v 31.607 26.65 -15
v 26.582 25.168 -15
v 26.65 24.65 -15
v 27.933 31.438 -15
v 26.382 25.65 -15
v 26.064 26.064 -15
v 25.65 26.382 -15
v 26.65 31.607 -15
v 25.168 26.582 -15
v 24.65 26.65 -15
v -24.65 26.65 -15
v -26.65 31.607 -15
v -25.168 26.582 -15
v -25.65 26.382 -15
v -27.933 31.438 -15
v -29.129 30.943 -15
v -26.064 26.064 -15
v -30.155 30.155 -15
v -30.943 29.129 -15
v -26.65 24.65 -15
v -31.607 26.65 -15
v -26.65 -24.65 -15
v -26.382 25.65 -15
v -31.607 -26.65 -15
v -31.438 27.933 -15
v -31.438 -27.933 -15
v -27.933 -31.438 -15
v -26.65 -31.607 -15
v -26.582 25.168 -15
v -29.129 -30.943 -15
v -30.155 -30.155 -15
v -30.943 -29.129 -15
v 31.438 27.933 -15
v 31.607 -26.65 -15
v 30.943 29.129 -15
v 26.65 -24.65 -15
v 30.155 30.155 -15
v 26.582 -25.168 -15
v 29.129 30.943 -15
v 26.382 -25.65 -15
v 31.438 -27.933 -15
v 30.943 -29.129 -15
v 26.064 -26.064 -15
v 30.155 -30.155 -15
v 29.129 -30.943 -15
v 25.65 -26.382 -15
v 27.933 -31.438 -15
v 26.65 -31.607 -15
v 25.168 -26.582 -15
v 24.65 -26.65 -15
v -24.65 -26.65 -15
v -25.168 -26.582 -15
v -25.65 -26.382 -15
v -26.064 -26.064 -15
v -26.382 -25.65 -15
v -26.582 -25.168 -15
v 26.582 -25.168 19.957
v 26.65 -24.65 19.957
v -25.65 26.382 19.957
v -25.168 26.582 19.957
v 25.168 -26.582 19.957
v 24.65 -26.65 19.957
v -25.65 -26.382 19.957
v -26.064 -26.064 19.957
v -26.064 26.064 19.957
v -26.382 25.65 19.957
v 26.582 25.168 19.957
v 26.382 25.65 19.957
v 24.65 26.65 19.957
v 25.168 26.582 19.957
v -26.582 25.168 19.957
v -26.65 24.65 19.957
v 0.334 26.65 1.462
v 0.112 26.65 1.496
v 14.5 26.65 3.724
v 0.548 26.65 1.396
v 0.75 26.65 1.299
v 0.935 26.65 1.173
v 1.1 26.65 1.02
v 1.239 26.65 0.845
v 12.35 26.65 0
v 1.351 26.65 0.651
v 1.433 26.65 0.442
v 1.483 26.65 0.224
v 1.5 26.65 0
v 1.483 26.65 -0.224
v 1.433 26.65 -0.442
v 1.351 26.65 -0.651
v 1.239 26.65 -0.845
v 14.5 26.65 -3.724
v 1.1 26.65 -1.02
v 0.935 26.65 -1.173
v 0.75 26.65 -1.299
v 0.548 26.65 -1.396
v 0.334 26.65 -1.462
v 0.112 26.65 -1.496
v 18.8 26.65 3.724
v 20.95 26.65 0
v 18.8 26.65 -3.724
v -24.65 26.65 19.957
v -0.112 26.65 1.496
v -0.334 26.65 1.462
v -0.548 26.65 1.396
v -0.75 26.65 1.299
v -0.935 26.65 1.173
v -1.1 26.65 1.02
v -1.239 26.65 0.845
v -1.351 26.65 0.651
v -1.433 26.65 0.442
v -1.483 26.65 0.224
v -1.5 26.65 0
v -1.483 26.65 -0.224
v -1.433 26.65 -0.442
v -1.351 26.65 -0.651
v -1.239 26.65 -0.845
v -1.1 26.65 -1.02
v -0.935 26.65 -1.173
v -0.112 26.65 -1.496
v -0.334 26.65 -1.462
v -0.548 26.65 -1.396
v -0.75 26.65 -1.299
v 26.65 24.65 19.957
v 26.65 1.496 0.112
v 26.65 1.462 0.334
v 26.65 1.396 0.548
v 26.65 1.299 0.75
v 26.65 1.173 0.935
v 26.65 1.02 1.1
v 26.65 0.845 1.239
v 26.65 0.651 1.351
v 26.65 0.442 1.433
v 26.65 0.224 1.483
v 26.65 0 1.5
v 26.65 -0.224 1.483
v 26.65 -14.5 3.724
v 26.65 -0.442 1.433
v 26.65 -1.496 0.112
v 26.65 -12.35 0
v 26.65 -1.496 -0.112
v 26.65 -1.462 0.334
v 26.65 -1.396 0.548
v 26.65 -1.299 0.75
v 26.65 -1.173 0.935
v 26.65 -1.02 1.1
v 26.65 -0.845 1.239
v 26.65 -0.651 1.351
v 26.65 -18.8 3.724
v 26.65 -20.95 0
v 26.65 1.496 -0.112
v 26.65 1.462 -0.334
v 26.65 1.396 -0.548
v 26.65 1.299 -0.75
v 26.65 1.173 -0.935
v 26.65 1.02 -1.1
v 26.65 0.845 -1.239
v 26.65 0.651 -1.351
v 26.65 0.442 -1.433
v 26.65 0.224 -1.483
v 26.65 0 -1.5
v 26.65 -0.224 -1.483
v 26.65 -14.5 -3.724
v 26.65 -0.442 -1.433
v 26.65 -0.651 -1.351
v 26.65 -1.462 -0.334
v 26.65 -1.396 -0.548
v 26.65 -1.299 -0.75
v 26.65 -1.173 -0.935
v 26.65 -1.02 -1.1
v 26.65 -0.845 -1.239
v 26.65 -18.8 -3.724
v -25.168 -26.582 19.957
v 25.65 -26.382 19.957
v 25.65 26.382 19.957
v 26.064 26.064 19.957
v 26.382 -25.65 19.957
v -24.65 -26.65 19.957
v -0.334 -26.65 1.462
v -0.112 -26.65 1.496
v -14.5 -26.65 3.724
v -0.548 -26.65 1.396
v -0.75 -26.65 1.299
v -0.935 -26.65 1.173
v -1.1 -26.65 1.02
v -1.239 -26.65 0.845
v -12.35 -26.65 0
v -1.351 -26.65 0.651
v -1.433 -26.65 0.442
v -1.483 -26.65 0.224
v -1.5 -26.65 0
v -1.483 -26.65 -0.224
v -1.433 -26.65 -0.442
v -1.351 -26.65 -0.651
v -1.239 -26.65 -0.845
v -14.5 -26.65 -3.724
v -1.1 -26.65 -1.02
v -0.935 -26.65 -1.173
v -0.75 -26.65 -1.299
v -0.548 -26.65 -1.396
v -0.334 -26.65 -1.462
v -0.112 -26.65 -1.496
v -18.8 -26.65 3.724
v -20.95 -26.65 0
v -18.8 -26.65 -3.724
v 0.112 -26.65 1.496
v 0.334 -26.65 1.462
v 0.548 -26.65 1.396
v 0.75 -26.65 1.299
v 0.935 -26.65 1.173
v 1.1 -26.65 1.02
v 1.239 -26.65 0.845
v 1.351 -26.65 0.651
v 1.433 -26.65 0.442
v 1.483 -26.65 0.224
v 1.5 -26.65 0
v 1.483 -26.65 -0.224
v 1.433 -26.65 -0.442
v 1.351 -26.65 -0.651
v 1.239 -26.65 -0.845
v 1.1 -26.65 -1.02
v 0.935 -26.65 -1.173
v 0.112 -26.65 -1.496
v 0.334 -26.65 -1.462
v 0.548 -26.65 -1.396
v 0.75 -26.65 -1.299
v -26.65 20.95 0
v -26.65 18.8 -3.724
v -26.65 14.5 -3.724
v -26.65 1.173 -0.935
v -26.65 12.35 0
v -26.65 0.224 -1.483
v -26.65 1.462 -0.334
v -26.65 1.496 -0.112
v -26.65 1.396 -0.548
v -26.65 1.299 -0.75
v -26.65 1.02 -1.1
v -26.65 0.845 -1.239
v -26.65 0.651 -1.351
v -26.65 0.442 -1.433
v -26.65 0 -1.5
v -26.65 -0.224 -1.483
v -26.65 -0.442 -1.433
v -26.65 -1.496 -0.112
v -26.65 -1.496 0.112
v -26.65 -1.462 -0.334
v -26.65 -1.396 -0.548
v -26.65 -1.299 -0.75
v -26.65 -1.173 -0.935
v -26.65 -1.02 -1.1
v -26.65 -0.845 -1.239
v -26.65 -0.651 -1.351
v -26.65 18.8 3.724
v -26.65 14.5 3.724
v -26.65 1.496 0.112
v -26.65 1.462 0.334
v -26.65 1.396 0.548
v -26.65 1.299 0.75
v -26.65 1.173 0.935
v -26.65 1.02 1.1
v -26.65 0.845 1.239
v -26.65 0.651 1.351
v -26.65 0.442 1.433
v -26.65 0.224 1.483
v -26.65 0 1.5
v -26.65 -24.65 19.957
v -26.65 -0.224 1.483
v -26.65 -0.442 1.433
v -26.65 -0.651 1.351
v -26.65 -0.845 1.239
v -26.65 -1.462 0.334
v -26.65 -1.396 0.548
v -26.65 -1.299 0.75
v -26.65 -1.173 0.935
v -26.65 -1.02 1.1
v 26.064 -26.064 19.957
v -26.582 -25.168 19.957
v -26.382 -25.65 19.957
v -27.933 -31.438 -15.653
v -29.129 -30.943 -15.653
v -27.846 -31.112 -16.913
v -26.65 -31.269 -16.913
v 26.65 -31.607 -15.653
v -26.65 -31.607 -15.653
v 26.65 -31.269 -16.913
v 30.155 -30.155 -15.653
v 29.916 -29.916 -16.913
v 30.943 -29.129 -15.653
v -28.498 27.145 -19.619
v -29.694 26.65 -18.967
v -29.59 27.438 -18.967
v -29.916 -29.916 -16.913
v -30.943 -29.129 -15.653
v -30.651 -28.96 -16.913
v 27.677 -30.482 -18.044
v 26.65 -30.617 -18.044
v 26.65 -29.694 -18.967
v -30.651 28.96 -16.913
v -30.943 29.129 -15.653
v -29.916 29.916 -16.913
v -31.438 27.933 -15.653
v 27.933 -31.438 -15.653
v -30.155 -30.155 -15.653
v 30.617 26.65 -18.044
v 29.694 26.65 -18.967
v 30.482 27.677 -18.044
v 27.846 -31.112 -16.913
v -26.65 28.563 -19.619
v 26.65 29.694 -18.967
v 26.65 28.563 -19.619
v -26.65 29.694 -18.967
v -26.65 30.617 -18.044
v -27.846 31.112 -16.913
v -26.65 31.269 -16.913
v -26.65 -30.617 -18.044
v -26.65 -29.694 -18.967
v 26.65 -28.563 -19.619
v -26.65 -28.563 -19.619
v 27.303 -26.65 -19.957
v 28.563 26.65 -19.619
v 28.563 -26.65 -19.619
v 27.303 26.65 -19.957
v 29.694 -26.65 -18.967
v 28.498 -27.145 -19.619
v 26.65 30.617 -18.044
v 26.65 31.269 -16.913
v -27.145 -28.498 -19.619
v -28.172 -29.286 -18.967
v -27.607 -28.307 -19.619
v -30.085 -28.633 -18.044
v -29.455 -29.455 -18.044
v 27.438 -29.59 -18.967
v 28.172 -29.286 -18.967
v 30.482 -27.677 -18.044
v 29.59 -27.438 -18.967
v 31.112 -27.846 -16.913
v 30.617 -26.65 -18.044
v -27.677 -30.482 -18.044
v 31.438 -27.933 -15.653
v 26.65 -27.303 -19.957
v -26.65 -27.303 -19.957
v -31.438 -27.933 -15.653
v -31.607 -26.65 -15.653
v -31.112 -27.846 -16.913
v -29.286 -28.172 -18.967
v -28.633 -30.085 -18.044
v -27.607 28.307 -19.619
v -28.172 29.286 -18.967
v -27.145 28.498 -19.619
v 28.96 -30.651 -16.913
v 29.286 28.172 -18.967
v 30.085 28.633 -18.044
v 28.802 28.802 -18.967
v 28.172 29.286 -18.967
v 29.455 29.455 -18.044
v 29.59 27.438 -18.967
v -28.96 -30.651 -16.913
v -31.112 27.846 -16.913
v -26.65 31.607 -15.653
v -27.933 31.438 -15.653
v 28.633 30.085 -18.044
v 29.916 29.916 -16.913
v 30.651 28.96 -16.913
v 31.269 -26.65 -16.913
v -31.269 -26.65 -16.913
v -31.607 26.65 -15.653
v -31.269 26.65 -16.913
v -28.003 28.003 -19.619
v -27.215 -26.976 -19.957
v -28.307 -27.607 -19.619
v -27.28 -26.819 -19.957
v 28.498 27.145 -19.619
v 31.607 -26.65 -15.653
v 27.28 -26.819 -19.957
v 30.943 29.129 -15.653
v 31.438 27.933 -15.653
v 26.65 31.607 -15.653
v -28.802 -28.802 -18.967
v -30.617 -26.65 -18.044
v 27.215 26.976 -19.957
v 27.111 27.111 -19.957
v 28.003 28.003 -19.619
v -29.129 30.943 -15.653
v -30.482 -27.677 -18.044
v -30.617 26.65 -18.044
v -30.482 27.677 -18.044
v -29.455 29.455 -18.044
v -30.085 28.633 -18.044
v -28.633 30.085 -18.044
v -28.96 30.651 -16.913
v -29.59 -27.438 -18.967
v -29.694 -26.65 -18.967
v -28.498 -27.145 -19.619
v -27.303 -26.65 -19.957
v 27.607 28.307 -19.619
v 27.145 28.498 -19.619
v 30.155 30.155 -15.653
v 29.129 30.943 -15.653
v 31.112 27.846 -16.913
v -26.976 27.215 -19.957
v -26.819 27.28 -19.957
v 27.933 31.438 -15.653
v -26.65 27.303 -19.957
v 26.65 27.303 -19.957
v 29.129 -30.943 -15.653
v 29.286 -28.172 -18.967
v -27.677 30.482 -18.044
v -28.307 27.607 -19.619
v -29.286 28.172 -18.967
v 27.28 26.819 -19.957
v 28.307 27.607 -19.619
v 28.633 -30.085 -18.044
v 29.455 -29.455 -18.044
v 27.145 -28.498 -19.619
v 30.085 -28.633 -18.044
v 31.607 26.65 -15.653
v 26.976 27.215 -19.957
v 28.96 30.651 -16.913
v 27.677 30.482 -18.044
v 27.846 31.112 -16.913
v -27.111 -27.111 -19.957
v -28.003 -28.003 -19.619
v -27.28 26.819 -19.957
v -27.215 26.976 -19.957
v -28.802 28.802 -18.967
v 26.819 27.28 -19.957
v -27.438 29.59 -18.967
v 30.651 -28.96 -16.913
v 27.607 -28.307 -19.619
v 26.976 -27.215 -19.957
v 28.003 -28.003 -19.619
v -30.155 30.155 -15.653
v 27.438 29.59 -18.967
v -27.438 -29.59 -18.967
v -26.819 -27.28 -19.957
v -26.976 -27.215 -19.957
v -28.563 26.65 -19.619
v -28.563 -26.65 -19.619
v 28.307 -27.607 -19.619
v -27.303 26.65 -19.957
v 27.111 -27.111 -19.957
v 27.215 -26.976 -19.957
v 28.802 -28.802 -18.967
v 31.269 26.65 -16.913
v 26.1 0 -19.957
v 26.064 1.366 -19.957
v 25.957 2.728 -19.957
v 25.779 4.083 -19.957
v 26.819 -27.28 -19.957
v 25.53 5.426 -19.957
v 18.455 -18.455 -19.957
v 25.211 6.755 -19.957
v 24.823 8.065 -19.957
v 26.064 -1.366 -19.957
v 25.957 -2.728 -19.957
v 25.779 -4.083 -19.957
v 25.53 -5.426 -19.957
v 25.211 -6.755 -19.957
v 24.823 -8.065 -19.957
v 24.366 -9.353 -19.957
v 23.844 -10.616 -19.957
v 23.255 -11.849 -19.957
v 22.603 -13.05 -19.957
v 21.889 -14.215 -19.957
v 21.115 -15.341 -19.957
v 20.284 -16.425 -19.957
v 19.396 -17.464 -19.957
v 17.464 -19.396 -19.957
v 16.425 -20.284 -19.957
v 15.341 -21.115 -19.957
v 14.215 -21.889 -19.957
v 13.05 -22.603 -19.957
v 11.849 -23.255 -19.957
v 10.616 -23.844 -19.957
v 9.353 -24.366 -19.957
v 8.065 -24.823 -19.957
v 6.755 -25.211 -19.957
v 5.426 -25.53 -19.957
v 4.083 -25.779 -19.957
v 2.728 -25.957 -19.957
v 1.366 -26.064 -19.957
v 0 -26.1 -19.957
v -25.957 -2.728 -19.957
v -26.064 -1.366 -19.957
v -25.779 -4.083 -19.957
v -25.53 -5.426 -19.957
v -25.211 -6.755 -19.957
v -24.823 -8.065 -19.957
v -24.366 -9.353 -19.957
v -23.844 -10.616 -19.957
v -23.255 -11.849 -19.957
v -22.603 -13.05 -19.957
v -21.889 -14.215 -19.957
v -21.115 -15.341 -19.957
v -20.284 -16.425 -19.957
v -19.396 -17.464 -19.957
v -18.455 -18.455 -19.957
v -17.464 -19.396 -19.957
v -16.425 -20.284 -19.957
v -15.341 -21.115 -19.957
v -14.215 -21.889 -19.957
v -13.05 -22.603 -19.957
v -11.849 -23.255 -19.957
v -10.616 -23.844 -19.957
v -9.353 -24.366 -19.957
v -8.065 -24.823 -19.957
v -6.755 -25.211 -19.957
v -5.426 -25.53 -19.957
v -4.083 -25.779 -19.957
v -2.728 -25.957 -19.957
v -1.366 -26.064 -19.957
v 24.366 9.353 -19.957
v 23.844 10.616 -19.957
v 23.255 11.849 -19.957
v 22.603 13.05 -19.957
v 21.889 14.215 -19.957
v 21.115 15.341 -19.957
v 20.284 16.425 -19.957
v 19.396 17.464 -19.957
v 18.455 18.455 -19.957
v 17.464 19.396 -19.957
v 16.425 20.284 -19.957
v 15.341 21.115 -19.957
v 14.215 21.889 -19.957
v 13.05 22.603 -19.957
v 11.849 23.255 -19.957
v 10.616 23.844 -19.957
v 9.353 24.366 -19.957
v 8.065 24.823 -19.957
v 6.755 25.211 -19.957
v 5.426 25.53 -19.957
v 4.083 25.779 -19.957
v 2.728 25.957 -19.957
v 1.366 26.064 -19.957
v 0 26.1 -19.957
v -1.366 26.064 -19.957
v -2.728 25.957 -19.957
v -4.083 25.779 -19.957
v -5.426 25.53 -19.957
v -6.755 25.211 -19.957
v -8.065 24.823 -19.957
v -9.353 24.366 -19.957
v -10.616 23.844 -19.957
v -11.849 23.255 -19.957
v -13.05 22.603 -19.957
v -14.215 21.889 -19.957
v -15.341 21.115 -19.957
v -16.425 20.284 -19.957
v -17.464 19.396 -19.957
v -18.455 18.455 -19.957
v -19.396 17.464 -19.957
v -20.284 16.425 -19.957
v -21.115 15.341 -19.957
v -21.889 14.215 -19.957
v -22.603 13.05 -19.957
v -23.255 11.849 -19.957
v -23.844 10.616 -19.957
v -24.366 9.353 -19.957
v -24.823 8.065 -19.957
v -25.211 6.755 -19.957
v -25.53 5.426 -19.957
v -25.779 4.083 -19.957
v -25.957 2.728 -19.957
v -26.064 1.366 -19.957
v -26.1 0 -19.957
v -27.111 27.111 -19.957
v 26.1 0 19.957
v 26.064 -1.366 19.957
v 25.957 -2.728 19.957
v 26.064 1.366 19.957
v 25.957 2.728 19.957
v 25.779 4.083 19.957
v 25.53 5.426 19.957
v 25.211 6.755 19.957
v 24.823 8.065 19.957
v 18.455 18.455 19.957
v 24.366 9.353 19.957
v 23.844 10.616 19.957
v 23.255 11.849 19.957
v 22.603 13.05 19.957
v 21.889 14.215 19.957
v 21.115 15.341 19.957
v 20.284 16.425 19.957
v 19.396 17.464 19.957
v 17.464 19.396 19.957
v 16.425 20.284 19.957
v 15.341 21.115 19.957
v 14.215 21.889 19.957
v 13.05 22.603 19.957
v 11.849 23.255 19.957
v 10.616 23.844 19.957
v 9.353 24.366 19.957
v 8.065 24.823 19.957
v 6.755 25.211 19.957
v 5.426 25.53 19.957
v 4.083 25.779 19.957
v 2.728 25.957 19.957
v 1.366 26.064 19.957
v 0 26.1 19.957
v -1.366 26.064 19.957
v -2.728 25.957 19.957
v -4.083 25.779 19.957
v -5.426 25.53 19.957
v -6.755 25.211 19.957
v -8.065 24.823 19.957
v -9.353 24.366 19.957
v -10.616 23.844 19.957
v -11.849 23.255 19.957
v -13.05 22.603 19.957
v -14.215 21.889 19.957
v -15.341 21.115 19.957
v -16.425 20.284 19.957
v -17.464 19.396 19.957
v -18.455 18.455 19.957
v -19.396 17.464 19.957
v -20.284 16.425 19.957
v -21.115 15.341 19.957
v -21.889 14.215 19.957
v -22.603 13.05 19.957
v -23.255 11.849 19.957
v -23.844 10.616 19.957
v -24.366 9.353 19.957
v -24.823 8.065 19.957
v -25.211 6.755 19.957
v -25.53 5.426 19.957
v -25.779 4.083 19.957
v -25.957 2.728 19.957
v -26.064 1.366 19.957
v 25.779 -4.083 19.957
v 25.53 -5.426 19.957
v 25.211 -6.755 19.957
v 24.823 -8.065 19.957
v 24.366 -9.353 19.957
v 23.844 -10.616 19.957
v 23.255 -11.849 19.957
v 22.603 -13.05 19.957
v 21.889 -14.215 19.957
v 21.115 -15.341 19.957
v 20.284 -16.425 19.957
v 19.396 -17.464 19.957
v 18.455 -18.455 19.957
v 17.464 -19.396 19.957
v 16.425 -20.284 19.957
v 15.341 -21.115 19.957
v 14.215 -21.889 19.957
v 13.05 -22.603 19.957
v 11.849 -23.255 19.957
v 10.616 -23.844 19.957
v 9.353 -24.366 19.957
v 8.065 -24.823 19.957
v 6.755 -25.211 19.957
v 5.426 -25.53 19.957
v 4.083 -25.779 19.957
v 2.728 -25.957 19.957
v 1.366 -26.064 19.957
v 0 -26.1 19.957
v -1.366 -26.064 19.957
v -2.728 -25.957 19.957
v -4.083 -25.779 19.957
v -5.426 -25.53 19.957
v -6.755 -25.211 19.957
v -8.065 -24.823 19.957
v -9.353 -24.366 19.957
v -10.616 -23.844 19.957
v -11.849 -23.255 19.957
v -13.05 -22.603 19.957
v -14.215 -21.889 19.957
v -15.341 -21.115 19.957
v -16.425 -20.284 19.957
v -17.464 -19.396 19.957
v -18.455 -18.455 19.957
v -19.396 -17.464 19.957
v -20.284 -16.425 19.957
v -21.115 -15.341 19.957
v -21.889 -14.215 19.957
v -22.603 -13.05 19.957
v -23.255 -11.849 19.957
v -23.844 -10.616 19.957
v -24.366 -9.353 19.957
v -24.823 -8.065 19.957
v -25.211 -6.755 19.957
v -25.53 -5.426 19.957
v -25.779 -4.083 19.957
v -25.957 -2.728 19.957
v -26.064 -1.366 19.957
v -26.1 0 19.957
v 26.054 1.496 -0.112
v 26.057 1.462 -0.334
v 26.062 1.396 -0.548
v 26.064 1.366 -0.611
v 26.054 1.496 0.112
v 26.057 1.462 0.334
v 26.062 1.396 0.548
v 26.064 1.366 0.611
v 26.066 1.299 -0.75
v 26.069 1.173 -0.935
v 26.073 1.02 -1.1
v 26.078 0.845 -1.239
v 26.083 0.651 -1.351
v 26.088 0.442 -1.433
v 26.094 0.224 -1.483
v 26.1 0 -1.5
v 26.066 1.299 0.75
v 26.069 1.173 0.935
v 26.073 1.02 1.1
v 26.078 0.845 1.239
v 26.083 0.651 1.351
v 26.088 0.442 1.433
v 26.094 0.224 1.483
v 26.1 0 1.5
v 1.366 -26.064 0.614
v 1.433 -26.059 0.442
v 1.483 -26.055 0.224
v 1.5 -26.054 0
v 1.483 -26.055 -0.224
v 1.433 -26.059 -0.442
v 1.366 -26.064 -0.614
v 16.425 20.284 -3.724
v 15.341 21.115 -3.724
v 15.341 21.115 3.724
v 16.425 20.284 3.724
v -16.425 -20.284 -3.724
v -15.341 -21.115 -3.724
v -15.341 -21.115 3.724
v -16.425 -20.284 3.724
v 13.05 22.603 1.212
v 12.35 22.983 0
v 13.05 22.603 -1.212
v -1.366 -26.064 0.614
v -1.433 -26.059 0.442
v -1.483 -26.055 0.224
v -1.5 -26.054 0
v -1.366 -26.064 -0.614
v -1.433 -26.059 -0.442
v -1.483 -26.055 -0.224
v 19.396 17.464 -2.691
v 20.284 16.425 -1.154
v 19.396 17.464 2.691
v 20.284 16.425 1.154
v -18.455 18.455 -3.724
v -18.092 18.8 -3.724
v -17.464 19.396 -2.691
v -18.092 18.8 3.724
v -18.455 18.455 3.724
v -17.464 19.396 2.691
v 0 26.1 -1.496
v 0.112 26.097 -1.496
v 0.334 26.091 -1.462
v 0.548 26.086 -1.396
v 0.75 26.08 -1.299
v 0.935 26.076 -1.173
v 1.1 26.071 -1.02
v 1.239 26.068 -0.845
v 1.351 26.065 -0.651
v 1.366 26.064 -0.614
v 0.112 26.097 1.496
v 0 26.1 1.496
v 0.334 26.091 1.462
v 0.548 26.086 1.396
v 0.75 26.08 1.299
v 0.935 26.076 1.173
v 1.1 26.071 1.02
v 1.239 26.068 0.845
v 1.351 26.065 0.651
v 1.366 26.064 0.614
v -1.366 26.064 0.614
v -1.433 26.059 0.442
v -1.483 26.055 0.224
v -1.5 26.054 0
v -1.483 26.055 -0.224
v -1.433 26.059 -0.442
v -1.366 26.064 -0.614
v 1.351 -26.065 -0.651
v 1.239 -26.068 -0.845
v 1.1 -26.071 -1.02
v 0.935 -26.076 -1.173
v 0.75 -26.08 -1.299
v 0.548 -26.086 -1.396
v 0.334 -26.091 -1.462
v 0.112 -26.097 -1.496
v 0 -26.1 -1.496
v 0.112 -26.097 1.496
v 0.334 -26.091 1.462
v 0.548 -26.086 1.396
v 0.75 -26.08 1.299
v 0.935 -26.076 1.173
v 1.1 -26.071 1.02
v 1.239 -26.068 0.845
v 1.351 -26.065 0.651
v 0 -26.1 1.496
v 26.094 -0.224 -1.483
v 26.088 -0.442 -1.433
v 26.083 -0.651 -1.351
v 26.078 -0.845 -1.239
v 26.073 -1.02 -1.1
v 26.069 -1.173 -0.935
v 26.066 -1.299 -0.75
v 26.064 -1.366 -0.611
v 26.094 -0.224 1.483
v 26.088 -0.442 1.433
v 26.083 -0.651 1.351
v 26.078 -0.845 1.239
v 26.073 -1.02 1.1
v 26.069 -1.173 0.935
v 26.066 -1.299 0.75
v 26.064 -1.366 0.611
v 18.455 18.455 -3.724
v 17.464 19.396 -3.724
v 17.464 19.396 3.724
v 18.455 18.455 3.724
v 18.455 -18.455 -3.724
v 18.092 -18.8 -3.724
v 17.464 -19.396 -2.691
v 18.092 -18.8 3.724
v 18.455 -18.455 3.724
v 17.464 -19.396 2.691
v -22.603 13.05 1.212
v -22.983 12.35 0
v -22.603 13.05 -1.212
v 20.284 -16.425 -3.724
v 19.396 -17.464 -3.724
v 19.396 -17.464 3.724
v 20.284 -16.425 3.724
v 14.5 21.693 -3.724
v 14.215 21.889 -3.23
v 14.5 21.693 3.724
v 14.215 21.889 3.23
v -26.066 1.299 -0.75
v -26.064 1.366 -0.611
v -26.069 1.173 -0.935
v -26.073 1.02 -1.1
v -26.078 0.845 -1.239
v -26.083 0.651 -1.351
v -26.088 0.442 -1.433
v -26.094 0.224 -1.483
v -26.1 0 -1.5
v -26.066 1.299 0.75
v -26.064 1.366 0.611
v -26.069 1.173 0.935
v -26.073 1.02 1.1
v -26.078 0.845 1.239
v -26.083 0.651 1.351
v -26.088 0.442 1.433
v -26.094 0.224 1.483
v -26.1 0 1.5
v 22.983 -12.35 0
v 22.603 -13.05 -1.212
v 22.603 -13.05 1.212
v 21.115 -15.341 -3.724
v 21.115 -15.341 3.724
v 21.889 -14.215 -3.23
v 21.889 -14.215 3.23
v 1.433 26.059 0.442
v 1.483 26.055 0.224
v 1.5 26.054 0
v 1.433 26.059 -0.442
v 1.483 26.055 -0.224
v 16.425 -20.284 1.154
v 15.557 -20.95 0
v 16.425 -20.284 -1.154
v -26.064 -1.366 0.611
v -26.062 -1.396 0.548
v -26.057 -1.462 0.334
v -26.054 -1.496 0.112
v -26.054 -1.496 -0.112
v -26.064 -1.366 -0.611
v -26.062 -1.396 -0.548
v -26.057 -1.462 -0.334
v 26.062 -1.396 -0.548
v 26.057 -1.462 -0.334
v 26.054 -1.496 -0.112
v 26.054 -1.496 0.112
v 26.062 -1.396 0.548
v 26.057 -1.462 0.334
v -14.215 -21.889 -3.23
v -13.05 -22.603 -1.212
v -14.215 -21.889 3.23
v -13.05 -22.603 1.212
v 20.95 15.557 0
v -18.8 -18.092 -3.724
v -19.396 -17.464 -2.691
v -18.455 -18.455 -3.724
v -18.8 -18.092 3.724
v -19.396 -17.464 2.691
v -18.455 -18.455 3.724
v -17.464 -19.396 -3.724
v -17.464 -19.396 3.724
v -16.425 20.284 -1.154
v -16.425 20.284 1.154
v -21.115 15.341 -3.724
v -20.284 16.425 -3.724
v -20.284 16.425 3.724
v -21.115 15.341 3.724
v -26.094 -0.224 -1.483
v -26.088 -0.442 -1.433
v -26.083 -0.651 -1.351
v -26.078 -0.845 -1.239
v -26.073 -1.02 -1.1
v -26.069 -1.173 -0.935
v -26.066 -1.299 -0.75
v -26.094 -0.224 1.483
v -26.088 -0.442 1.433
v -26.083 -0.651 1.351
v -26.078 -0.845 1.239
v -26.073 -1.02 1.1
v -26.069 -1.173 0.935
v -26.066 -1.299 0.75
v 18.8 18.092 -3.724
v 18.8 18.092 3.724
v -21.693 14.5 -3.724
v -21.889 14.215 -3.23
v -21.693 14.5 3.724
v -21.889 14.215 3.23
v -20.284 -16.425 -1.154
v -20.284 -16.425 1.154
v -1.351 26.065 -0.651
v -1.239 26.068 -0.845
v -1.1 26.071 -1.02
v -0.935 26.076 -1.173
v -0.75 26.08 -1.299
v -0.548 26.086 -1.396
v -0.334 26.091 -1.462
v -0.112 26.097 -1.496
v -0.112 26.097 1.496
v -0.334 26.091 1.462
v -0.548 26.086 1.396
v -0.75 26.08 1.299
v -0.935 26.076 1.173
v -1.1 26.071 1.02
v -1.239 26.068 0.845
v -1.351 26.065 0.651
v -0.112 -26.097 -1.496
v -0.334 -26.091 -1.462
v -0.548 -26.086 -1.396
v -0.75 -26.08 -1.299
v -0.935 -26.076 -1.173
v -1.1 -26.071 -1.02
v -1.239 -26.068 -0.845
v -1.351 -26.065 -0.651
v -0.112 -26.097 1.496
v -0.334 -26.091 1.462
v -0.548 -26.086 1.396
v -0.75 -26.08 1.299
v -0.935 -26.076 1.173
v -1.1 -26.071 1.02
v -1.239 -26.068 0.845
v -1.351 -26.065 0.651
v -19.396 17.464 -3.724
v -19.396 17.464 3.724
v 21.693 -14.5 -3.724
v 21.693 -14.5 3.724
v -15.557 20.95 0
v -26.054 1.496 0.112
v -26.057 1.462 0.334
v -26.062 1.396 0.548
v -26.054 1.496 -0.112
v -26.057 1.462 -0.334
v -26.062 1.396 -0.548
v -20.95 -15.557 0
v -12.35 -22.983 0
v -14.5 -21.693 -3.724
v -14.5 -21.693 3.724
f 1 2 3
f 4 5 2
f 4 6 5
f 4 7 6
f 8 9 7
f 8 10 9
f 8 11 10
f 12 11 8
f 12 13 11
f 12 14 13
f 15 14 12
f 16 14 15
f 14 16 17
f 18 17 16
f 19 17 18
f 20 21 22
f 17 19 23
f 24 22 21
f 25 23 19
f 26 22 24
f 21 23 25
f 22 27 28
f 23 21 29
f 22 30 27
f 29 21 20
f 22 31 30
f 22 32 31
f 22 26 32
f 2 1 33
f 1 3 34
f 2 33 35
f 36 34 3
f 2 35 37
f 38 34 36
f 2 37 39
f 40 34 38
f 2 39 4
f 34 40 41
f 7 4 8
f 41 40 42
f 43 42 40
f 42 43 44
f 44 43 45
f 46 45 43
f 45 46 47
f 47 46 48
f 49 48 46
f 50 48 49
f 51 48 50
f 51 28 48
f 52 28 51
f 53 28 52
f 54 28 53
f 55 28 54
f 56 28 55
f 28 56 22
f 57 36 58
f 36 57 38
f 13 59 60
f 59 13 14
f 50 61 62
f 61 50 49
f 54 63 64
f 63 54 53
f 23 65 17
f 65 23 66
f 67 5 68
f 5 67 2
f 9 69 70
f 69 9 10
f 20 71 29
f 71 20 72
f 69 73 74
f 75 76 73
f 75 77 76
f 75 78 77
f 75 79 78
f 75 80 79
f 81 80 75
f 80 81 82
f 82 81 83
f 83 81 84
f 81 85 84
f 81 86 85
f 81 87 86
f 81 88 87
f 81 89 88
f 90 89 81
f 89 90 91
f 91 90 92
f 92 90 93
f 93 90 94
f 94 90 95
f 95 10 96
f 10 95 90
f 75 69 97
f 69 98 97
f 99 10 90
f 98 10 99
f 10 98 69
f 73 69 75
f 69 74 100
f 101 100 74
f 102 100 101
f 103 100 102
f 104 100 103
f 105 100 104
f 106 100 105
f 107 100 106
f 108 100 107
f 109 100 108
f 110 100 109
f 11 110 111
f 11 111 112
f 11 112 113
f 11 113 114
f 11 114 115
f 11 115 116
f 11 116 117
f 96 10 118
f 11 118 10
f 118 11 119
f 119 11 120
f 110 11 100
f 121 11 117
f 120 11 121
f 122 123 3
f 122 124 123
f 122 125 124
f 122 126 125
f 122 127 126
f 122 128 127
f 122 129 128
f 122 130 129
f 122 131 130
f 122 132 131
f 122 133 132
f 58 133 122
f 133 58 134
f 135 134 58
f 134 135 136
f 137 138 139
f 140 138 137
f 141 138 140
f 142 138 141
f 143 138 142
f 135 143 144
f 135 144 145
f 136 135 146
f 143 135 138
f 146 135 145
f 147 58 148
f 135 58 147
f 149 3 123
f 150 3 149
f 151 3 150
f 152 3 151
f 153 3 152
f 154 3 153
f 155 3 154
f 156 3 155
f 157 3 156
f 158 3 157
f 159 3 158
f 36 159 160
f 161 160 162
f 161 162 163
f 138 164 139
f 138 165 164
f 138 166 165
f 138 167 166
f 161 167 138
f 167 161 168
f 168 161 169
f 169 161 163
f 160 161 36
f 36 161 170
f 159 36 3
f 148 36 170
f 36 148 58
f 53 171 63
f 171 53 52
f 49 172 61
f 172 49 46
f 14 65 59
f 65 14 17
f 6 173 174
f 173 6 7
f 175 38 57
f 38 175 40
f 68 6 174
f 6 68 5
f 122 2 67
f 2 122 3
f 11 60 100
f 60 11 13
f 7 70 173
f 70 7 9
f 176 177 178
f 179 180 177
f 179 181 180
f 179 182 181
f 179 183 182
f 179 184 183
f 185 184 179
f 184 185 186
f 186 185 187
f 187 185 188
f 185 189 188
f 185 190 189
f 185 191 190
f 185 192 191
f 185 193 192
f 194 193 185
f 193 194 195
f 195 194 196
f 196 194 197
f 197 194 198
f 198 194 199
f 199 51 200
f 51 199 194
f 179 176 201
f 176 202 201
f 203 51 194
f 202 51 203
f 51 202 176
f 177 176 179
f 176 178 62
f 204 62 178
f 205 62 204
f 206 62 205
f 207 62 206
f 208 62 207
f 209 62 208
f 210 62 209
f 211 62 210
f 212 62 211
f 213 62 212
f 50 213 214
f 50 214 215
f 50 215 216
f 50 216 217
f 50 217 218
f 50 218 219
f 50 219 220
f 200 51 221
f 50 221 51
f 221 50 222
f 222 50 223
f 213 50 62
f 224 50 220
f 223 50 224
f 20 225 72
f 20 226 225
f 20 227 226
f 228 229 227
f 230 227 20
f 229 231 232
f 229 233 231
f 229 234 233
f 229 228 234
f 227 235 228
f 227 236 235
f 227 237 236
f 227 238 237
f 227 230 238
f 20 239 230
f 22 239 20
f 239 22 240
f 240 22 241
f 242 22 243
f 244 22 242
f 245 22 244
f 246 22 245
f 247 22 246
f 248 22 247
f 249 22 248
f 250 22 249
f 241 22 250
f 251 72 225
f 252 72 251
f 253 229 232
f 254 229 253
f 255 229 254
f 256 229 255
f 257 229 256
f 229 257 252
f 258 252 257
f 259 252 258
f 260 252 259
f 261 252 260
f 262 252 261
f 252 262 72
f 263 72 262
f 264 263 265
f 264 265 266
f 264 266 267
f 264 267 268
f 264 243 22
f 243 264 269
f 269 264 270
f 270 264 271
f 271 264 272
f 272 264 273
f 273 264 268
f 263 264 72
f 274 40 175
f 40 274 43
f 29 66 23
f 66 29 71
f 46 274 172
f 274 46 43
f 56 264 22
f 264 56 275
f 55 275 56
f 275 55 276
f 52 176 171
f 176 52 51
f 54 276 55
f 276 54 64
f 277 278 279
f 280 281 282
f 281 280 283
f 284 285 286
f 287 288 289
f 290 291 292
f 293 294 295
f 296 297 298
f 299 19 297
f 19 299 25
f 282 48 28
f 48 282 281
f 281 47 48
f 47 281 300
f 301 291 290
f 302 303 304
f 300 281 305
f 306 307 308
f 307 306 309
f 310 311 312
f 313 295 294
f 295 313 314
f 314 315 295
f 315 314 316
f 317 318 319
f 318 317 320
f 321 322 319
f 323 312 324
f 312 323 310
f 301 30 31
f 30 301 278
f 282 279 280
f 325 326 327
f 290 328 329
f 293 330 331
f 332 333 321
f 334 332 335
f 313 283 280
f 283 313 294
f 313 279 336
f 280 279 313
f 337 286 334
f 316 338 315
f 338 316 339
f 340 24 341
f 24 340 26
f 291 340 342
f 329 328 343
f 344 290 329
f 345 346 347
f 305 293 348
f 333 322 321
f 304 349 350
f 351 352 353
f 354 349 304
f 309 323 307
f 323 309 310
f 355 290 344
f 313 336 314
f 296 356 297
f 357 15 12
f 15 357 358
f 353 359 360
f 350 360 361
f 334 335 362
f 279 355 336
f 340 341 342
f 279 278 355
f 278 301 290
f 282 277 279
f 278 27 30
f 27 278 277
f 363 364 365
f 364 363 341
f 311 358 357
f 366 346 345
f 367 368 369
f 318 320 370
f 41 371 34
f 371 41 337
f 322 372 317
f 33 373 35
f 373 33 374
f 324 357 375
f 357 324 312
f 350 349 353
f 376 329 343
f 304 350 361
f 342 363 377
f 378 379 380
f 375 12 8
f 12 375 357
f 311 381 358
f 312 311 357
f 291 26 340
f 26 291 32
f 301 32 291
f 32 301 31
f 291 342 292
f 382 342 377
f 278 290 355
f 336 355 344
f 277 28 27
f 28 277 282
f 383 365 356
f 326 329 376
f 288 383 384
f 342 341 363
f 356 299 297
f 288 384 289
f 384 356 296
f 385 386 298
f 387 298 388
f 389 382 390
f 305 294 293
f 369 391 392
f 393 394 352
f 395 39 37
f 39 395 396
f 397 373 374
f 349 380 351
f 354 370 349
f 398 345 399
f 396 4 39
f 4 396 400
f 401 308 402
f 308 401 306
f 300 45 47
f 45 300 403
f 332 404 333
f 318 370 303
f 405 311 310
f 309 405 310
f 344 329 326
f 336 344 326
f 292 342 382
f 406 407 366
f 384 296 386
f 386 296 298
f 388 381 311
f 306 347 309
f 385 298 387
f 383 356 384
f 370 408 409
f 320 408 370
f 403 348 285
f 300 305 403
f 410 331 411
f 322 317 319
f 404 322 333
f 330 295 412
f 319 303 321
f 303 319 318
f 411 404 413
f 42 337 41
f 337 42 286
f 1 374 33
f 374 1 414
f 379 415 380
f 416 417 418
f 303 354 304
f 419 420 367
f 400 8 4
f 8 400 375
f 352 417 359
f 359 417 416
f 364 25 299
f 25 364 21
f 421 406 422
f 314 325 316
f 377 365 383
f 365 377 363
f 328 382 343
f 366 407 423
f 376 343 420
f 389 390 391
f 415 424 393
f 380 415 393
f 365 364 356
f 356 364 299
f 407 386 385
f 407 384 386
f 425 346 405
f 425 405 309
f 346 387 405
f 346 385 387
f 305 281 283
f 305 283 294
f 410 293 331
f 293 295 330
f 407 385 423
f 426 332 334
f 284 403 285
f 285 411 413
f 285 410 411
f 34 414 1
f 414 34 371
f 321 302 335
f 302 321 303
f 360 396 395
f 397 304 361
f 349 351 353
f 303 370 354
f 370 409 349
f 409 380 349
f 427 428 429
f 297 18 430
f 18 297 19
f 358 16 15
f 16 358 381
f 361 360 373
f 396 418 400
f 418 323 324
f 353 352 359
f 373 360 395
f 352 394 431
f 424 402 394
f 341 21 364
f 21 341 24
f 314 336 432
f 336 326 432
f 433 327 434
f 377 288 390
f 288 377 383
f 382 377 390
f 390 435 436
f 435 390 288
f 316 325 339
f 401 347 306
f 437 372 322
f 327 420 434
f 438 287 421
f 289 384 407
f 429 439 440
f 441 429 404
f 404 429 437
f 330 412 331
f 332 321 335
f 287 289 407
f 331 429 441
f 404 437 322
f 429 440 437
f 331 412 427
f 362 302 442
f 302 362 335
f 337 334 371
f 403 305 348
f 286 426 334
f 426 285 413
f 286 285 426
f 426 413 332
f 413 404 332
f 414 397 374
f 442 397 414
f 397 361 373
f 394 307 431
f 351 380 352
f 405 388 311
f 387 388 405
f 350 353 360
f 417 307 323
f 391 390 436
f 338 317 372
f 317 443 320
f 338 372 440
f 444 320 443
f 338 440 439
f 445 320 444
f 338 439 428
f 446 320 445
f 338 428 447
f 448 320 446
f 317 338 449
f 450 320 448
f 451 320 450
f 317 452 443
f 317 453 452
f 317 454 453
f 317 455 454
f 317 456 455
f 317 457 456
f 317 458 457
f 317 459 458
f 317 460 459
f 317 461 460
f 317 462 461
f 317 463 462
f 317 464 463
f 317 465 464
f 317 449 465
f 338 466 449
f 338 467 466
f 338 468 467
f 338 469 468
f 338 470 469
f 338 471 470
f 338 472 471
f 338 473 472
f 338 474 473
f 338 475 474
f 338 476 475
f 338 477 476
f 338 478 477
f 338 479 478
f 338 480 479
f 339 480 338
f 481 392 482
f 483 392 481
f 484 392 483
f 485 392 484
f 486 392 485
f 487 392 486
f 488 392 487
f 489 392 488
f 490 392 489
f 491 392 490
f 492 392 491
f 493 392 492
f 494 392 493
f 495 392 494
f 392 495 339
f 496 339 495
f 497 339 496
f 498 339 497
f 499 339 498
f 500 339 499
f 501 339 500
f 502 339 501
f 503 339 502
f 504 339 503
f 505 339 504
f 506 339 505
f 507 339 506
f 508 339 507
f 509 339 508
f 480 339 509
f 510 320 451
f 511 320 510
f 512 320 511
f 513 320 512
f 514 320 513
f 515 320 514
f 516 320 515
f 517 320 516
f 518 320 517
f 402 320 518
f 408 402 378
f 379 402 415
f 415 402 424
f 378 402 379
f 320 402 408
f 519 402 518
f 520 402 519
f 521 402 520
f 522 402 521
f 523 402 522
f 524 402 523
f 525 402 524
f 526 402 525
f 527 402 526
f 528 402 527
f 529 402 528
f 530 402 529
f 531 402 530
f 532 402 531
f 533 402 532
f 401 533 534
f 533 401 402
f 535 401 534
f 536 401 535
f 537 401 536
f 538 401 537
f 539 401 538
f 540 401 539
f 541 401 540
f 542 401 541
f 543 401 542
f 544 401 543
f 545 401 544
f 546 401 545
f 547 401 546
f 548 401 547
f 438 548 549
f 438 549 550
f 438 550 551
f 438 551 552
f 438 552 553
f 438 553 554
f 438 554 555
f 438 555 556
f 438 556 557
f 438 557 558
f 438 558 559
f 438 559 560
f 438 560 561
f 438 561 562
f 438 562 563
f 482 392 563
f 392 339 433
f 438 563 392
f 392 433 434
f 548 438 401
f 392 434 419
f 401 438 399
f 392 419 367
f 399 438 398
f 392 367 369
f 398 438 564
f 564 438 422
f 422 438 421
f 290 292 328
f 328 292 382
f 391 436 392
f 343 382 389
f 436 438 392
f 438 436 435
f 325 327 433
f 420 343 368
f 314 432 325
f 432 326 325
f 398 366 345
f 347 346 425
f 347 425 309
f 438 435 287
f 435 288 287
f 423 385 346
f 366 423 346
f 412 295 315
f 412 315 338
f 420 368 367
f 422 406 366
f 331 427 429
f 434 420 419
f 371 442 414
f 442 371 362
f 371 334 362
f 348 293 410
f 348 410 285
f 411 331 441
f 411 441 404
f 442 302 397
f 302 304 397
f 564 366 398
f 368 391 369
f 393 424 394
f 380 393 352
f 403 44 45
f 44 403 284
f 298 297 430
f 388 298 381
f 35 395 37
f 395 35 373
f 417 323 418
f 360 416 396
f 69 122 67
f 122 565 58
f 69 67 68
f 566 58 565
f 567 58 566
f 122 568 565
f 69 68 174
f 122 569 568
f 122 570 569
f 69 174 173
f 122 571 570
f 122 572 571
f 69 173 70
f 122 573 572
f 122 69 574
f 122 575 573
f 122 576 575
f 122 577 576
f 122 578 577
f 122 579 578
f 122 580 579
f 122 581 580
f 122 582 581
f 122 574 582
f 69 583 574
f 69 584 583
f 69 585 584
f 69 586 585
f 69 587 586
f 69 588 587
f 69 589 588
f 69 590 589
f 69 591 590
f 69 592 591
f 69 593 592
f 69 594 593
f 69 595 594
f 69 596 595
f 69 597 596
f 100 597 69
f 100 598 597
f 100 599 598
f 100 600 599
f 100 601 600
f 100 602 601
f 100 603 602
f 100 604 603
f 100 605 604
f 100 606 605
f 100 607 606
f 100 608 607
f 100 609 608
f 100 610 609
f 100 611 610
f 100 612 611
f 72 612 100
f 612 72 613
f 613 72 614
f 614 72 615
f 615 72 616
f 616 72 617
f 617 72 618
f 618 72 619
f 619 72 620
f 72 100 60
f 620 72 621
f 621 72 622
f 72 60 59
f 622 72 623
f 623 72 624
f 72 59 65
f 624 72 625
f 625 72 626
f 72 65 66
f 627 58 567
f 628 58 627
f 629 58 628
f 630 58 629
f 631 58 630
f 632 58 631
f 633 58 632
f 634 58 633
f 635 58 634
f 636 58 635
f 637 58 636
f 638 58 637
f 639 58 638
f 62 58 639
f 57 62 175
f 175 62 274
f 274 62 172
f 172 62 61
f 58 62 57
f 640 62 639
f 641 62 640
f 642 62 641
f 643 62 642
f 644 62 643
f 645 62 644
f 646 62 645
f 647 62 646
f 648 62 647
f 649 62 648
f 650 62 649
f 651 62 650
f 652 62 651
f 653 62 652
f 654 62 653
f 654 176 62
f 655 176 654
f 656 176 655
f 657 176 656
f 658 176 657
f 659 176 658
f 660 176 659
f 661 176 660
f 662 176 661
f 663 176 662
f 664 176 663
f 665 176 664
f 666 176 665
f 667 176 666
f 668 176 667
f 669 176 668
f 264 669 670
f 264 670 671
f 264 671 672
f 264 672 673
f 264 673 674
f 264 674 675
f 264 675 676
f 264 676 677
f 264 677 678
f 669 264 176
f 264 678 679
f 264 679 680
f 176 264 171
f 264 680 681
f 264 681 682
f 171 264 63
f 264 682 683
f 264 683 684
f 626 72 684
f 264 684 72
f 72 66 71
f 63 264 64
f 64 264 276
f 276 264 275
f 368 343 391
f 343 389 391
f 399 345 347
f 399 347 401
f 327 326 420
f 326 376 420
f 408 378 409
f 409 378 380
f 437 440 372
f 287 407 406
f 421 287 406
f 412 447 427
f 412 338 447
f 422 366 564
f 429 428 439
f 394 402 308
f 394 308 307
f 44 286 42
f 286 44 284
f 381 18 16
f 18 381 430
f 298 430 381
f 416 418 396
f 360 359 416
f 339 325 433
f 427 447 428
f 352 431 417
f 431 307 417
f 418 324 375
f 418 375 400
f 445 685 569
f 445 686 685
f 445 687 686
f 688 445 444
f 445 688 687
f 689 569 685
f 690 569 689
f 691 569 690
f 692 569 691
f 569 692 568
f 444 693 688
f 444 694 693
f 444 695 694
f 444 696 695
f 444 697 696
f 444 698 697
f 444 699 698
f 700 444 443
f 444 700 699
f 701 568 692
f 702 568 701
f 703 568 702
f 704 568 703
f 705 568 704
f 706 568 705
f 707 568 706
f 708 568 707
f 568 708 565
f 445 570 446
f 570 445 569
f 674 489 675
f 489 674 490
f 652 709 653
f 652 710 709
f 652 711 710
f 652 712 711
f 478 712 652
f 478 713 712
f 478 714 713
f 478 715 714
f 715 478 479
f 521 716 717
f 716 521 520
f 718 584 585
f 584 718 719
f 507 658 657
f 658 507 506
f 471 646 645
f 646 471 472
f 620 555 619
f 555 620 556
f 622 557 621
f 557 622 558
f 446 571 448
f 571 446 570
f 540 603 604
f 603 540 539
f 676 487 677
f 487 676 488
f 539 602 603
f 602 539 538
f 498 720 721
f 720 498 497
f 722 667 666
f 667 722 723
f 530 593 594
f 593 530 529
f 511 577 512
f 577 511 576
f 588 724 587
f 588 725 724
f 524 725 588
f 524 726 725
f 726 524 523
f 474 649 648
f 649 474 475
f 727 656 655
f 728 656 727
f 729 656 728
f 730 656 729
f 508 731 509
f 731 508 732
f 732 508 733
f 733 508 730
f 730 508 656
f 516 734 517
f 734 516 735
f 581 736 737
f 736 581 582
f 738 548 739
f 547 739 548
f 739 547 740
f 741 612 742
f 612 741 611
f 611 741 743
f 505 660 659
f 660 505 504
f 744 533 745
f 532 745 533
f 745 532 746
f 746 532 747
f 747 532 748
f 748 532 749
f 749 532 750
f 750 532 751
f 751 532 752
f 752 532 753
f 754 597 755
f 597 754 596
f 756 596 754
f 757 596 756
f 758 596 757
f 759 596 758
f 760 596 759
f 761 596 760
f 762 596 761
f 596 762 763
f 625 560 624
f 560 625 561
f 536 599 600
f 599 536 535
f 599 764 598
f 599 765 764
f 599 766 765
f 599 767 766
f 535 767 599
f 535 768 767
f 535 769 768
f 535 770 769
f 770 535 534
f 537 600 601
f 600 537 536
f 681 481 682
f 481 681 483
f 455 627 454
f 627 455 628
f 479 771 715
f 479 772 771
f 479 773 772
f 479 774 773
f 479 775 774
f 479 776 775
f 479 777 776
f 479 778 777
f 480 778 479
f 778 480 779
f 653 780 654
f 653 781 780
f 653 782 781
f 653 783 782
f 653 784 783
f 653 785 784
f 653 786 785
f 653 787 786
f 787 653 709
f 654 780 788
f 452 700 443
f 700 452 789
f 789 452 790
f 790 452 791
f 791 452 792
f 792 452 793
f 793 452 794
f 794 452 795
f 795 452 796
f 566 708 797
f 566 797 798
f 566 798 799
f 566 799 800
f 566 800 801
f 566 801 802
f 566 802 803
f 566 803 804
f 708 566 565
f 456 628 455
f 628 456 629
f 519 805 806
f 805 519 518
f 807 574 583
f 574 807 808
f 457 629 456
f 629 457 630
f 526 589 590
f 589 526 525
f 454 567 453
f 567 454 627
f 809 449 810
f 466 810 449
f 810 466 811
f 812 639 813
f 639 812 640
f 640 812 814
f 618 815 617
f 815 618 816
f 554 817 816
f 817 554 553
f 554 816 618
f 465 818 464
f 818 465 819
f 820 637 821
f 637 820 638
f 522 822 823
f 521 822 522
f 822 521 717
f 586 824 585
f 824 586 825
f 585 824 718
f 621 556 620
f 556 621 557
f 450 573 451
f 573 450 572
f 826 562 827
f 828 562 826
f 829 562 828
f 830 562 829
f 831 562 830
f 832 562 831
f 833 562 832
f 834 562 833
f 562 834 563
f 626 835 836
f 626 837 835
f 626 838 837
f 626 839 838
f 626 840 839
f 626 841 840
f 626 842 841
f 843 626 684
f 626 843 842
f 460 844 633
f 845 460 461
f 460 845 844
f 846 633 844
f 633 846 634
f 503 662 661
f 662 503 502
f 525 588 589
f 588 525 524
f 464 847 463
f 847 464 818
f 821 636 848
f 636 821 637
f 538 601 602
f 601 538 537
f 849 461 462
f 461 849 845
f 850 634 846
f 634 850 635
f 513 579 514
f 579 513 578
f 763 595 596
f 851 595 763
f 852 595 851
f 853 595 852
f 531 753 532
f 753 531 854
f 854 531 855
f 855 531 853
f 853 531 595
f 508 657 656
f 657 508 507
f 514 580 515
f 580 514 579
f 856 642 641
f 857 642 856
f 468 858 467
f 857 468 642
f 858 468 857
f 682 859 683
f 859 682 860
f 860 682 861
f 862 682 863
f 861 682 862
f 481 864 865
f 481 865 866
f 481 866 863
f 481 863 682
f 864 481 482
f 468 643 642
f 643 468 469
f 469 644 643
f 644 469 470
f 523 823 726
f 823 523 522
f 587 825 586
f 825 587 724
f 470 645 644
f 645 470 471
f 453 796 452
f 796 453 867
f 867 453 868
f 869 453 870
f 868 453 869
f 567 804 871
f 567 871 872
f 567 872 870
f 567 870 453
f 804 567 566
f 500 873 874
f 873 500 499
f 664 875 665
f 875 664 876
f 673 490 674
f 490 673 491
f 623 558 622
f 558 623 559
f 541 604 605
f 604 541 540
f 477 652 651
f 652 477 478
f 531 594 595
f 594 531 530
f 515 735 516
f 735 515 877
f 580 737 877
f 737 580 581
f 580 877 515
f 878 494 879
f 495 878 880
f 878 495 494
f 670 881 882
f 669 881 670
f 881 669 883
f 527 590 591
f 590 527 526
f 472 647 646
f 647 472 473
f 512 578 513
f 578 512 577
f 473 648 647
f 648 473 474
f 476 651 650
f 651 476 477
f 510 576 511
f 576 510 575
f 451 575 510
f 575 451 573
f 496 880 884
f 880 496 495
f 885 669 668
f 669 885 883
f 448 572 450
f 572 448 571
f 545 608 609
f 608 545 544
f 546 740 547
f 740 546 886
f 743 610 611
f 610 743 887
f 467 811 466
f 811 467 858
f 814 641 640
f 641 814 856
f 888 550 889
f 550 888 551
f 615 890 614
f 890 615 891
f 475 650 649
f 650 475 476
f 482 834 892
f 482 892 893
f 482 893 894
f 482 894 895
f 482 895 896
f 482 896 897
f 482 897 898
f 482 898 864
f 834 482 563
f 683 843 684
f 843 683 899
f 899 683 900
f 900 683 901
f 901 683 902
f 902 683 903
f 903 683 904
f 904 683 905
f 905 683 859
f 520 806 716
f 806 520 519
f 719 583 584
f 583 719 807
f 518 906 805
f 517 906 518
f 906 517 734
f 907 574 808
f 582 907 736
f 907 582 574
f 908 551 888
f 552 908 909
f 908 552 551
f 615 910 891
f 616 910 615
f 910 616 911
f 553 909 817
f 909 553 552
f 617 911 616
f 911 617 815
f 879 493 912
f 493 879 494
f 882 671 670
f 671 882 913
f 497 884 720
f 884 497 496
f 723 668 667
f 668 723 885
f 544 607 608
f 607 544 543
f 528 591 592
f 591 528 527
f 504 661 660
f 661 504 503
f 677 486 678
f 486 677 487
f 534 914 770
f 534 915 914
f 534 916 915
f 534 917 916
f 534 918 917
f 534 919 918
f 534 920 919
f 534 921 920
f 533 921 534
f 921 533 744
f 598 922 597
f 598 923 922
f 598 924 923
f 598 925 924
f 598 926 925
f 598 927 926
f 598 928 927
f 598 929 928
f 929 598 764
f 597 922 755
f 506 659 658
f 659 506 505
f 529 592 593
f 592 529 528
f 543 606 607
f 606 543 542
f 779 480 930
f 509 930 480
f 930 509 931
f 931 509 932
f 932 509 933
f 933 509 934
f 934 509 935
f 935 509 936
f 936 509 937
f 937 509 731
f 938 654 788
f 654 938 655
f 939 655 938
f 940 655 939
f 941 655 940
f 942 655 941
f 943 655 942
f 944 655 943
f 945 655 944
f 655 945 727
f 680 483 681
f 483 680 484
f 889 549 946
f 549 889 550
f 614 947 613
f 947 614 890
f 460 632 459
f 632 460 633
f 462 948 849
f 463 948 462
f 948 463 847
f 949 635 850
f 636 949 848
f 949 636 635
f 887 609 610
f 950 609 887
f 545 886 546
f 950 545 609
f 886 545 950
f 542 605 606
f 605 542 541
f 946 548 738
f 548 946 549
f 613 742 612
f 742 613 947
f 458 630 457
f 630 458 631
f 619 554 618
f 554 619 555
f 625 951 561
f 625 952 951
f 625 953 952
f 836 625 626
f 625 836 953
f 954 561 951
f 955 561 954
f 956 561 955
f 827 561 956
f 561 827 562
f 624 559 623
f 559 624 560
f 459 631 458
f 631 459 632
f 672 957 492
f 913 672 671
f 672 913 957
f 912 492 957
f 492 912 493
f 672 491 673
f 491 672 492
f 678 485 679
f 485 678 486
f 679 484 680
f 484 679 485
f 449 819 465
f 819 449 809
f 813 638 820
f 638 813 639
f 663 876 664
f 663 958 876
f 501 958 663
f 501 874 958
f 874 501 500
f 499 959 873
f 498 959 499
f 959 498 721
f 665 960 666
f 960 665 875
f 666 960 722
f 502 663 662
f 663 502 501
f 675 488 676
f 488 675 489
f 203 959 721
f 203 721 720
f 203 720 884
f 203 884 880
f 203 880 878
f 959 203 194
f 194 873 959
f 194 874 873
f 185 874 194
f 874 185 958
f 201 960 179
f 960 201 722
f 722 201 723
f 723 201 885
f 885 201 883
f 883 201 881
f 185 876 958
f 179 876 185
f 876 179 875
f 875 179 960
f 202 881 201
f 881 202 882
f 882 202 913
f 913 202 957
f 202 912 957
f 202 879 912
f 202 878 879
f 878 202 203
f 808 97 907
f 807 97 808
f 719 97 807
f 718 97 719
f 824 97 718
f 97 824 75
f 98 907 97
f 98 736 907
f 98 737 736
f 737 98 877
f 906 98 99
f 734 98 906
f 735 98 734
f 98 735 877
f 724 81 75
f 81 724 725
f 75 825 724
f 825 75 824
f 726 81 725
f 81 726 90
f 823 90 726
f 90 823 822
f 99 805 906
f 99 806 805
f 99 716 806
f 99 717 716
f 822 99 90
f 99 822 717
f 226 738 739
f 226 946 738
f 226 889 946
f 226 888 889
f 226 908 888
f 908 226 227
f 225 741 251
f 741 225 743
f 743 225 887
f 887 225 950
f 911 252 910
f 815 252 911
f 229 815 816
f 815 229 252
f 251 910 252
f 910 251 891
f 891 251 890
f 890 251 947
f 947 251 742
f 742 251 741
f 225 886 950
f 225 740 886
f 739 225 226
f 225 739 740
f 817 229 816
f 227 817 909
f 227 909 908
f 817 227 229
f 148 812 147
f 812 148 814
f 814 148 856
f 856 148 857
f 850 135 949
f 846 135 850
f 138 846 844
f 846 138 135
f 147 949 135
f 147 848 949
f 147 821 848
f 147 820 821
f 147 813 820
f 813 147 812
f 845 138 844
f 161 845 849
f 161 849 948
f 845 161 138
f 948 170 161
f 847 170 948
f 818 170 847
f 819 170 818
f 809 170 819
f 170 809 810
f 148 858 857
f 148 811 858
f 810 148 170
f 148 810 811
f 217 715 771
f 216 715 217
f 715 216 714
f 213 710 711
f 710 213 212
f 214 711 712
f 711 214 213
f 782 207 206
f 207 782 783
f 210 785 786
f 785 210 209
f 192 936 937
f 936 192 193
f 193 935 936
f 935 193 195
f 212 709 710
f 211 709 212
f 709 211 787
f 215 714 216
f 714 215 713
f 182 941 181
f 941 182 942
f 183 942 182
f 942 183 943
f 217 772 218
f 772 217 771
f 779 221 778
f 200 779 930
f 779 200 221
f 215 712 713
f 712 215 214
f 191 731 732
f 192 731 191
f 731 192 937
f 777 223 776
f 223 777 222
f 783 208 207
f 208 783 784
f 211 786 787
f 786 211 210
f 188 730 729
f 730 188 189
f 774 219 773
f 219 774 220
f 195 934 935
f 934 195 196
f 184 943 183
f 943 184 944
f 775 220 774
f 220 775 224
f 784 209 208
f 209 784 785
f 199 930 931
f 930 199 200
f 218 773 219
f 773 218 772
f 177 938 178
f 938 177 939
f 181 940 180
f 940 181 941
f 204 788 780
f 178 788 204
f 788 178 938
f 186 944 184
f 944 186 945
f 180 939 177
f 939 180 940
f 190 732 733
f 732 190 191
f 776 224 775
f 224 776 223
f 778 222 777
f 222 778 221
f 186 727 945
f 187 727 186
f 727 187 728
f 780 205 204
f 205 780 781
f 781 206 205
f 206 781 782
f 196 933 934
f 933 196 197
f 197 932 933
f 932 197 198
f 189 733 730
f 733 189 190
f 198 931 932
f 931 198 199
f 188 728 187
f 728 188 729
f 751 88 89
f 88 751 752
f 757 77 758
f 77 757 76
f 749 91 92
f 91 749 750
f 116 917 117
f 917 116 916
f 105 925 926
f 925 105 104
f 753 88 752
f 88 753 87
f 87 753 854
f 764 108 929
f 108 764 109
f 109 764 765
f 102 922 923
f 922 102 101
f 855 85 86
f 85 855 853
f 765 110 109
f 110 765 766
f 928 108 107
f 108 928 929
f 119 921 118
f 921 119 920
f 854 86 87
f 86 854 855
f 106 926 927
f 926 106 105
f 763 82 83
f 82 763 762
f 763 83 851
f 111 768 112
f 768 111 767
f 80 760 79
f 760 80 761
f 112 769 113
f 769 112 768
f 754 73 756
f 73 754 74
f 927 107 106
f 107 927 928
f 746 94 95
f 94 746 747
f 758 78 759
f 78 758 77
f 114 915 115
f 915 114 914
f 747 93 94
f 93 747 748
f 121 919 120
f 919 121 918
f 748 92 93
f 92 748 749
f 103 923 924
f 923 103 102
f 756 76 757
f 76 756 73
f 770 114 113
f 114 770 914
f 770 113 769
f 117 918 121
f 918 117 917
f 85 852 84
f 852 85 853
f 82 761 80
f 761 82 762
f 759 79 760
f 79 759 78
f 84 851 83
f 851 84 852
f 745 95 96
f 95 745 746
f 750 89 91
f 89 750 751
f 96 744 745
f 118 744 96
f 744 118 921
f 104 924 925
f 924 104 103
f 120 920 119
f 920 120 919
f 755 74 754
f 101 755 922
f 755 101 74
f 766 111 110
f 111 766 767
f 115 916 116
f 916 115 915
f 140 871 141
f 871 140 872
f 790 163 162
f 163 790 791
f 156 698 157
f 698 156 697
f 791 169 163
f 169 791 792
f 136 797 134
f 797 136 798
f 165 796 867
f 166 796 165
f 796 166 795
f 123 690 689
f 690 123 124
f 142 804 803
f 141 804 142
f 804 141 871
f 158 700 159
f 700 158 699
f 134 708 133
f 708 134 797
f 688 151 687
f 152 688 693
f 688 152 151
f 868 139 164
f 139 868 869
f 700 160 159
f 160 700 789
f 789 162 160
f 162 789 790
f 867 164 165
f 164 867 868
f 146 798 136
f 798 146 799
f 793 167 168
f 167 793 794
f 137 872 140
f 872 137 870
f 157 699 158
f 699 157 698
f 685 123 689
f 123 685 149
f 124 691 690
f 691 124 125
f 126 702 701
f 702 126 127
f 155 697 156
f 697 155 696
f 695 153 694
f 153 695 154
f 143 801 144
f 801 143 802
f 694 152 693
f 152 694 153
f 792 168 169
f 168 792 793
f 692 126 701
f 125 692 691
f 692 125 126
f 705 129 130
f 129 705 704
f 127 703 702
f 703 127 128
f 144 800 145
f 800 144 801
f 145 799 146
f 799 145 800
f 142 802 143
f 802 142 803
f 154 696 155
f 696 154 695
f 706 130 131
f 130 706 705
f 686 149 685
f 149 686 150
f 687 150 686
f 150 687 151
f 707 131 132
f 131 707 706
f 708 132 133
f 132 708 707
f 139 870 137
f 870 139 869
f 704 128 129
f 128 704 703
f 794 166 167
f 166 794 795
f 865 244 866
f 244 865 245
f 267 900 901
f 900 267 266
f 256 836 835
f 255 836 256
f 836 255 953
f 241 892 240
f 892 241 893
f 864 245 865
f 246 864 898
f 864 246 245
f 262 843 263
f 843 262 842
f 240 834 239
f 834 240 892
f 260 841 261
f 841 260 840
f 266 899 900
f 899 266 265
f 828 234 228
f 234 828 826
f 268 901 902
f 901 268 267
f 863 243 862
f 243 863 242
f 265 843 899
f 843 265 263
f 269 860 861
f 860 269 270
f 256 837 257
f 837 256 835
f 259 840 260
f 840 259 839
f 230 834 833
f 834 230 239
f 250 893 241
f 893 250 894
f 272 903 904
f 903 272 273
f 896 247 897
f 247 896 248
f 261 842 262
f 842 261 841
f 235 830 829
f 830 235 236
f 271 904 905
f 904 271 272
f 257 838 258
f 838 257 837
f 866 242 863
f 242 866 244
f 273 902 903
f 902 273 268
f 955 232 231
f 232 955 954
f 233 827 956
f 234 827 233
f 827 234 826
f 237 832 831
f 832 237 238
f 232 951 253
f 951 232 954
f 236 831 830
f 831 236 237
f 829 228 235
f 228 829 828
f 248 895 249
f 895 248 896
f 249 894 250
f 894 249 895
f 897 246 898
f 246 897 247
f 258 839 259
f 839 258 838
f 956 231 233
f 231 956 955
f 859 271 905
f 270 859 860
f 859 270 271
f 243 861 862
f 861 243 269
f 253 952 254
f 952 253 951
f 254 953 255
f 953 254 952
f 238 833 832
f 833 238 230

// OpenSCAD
// file: clamp.scad
// Generic clamp for the projector stand

// Copyright (C) 2020 Jeremy Bennett <jeremy@jeremybennett.com>

// Contributor Jeremy Bennett <jeremy@jeremybennett.com>

// SPDX-License-Identifier: CC-BY-SA-4.0

// This fits inside the square to ensure a snug fit on the alumnium tube. This
// is the generic design, with variants for the upper and lower clamp.

// Useful constants
EPS = 0.1;			// Small distance
TUBE_R = 52.2 / 2.0;		// Radius of alumninium tube measured 51.6
SQUARE_L = 53.3;		// Dimensions of the square
SQUARE_W = 53.3;
SQUARE_H = 30.0;
OUTER_ROUND_R = 5.0;		// Curvature of outer edge
INNER_ROUND_R = 2.0;		// Curvature of inner corners
BOLT_OFF = SQUARE_W / 2.0 - 10.0;
HEAD_R = 8.6 / 2.0;		// Screw head face-to-face (nominal 8.0 diameter)
GRUB_R = 3.0 / 2.0;		// Space for grub screw tip

// The basic block with rounded edges from which we cut out everything else.
module big_block () {
     minkowski () {
	  cube (size = [SQUARE_L, SQUARE_W, SQUARE_H], center = true);
	  sphere (r = OUTER_ROUND_R, $fn = 24);
     }
}

// The inner block with rounded corners used to trim the big block
module hollow_block () {
     difference () {
	  translate (v = [0, 0, SQUARE_H / 2])
	       cube (size = [SQUARE_L * 2, SQUARE_W * 2, SQUARE_H * 2],
		     center = true);
	  minkowski () {
	       cube (size = [SQUARE_L - INNER_ROUND_R * 2,
			     SQUARE_W - INNER_ROUND_R * 2, SQUARE_H],
		     center = true);
	       cylinder (h = SQUARE_H, r = INNER_ROUND_R, center = true,
			 $fn = 24);
	  }
     }
}

// Cut out the edges and the central hole
module raw_clamp () {
     difference () {
	  big_block ();
	  hollow_block ();
	  cylinder (r = TUBE_R, h = SQUARE_H + OUTER_ROUND_R * 2, center = true,
		    $fn = 120);
     }
}

// The hole in which the nut will fit.
module nut_hole () {
     rotate (a = [90, 0, 0])
	  cylinder (r = HEAD_R, h = SQUARE_W + EPS, $fn = 6, center = true);
}

// The module for the clamp can be generated without the nut holes.
module clamp (make_holes) {
     difference () {
	  raw_clamp ();
	  // Optional Nut holes
	  if (make_holes) {
	       translate (v = [-BOLT_OFF, -SQUARE_W / 2.0, 0])
		    nut_hole ();
	       translate (v = [BOLT_OFF, SQUARE_W / 2.0, 0])
		    nut_hole ();
	       translate (v = [-SQUARE_W / 2.0, BOLT_OFF, 0])
		    rotate (a = [0, 0, -90])
		         nut_hole ();
	       translate (v = [SQUARE_W / 2.0, -BOLT_OFF, 0])
		    rotate (a = [0, 0, -90])
		         nut_hole ();
	  }
	  // Grub screw holes
	  rotate (a = [90, 0, 0])
	       cylinder (r = GRUB_R, h = SQUARE_W, $fn = 42);
	  rotate (a = [-90, 0, 0])
	       cylinder (r = GRUB_R, h = SQUARE_W, $fn = 42);
	  rotate (a = [0, 90, 0])
	       cylinder (r = GRUB_R, h = SQUARE_L, $fn = 42);
	  rotate (a = [0, -90, 0])
	       cylinder (r = GRUB_R, h = SQUARE_L, $fn = 42);
     }
}
// main file
// Lower clamp for the projector stand

// Copyright (C) 2020 Jeremy Bennett <jeremy@jeremybennett.com>

// Contributor Jeremy Bennett <jeremy@jeremybennett.com>

// SPDX-License-Identifier: CC-BY-SA-4.0

// The upper clamp has bolt head holes
include <clamp.scad>

// Generate a clamp with nut holes
clamp (true);
